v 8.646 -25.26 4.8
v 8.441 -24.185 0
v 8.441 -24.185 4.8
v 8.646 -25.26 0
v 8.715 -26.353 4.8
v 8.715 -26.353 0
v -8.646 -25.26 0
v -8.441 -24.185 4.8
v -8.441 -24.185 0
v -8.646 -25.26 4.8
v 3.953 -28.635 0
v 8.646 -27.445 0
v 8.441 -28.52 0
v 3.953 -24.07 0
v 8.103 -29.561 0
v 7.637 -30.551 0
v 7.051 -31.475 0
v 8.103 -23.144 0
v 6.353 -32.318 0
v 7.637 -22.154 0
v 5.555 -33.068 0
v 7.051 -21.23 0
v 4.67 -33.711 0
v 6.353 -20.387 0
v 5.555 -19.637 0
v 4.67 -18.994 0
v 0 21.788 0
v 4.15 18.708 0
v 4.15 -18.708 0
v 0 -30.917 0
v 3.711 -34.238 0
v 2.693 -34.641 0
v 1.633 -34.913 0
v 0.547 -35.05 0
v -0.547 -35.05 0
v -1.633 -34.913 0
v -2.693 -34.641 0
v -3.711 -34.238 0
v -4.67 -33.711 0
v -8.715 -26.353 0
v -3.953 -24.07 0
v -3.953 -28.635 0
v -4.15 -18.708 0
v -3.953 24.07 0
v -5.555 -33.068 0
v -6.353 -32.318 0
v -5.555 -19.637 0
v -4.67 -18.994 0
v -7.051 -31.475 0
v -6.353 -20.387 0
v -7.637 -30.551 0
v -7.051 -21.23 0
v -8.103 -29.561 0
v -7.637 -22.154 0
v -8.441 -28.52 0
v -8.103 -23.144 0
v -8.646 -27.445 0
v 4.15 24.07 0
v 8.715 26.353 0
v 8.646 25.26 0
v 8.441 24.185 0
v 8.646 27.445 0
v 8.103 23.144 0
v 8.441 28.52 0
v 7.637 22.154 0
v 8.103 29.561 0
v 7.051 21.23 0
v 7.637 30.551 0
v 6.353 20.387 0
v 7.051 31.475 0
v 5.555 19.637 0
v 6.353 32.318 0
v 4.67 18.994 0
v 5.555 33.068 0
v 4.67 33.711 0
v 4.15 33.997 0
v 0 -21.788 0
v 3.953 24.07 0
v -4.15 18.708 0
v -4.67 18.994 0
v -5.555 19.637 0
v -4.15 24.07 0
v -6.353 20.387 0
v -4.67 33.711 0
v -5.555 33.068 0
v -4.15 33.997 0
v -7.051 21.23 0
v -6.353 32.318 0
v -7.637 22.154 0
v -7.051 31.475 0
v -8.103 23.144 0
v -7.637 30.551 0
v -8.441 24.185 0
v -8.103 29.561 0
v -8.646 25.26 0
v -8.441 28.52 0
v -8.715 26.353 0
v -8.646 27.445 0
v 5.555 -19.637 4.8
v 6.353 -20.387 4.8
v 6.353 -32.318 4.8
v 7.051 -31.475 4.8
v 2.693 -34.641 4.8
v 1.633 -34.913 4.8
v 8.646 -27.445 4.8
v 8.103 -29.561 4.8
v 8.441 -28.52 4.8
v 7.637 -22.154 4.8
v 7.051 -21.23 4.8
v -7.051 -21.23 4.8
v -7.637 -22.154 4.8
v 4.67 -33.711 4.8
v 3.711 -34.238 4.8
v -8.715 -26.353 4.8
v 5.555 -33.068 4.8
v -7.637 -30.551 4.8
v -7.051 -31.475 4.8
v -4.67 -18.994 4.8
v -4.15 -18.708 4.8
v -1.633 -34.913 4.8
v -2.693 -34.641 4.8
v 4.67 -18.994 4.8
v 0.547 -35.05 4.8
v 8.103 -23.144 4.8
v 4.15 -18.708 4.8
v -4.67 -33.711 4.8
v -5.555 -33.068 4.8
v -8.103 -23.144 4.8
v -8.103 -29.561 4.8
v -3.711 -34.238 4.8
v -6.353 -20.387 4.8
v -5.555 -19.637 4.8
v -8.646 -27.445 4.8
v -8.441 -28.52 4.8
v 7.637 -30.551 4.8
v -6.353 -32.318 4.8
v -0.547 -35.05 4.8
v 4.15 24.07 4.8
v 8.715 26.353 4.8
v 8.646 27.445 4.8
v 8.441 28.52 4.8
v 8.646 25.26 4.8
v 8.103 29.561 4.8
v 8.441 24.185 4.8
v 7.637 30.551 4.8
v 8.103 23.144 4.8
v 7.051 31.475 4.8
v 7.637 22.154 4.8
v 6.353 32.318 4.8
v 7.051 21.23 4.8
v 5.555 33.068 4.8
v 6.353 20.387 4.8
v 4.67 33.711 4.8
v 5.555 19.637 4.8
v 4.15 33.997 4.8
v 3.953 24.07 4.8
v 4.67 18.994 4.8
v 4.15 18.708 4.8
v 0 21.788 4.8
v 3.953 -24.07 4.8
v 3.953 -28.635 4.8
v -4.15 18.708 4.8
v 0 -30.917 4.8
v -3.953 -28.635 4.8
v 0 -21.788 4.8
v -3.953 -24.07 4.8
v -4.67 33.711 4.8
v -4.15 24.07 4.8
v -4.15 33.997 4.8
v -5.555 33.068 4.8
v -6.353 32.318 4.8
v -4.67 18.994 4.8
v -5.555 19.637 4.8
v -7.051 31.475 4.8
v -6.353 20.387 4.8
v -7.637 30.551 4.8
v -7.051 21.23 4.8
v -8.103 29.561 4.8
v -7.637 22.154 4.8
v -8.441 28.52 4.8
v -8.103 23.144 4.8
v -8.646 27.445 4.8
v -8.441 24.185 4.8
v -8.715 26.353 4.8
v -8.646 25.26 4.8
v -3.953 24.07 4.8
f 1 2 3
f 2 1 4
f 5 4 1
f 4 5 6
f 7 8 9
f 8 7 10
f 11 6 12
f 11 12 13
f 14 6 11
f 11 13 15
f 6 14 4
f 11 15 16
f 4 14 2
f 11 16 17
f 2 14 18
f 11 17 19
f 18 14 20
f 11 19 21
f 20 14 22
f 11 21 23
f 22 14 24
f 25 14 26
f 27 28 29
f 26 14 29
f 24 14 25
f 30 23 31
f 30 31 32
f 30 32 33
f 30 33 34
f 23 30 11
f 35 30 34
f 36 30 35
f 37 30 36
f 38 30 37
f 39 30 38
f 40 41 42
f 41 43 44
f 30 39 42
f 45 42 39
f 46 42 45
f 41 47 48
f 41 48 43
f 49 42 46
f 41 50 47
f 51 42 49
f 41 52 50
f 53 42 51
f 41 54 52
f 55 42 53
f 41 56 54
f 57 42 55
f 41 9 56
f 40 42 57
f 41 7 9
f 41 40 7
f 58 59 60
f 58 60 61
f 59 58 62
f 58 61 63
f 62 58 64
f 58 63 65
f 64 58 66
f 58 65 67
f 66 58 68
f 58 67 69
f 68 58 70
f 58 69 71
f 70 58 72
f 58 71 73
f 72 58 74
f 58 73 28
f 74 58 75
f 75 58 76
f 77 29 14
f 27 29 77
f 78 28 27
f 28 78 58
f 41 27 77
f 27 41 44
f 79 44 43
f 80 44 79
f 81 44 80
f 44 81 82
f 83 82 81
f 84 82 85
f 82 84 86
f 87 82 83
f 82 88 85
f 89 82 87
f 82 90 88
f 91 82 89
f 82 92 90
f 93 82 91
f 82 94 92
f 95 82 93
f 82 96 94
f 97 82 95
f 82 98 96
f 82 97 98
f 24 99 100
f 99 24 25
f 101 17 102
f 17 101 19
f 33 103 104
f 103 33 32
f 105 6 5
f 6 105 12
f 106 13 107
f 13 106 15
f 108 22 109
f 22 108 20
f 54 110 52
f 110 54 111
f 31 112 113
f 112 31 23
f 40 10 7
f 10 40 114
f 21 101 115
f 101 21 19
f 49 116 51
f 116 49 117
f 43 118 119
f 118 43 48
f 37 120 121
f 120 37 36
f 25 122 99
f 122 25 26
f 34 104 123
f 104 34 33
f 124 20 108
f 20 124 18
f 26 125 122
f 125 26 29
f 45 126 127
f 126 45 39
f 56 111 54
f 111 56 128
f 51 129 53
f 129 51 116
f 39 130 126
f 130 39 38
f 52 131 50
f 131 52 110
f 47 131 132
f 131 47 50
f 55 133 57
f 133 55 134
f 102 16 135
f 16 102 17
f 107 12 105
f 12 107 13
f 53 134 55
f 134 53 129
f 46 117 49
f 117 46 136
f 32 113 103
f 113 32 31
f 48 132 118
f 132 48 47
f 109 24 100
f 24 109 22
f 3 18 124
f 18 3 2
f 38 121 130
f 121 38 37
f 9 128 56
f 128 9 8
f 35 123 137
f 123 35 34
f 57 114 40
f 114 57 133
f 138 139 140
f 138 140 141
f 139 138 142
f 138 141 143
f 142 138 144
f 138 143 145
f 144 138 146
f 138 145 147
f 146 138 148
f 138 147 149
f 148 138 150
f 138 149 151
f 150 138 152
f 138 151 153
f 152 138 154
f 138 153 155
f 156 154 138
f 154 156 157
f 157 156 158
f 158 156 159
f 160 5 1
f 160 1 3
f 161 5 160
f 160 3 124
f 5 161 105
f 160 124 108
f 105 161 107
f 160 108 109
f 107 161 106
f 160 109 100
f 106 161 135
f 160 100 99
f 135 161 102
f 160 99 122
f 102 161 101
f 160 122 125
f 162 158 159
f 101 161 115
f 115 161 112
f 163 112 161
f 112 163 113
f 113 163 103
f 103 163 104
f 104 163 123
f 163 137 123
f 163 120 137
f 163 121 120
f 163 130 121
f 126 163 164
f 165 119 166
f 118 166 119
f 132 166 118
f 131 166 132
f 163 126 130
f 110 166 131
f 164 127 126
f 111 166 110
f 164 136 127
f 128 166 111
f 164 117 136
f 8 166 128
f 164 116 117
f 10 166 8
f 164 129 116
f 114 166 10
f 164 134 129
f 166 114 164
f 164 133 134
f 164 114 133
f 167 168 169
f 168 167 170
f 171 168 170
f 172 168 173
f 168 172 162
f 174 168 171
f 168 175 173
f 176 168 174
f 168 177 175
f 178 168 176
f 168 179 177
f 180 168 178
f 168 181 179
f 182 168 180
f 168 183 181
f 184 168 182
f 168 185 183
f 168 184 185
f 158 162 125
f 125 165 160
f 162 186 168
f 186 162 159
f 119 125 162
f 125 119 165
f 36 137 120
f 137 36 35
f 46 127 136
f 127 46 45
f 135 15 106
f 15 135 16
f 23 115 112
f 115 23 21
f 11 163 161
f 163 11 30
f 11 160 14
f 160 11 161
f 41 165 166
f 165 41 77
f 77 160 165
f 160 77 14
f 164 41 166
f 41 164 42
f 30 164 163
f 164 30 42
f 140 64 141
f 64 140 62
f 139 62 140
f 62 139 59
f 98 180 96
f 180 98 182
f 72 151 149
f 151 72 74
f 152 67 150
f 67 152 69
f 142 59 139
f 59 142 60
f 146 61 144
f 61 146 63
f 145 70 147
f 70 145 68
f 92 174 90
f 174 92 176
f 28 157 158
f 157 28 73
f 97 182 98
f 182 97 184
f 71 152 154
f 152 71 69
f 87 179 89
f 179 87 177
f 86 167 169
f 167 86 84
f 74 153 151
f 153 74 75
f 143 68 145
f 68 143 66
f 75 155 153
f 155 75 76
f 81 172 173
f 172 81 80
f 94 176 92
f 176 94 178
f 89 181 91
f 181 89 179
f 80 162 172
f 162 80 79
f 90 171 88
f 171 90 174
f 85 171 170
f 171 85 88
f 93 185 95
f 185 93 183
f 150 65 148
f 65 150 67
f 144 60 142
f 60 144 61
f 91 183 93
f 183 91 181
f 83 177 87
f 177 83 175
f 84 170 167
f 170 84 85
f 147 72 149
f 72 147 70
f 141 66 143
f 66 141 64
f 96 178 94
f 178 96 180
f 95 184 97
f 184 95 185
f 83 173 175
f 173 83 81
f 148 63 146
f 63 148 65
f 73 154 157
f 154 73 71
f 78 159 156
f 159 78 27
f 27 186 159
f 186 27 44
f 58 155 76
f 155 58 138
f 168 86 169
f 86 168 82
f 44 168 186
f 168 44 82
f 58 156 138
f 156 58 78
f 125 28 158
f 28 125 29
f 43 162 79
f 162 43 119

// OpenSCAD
//use <../MCAD/shapes.scad>		// For octagon

$fn = 50;					// So the cylinders are smooth

nut_diameter = 8.3;			// My M3 nut measured ~5.4, I added a fudge factor
nut_thickness = 4;

// Calculate some nice values

wrench_thickness = 1.2 * nut_thickness;
wrench_length = 5.25 * nut_diameter;
wrench_head_extra_d = 1.1 * nut_diameter;	// If your wrench is big, you
										// probably just want this to be 10

// Something to make wrench heads for us

module wrench_head(thickness, nut_d, head_extra, open_ended) {
	difference() {
		translate([0, 0, -thickness / 2]) {
			cylinder(h = thickness, r = (nut_d + head_extra) / 2);
		}

		rotate(30) {
			hexagon(nut_d, thickness * 1.1);
		}

		translate([0, nut_d / 2, 0]) {
			if (open_ended) {
				box(nut_d, nut_d + head_extra / 2, thickness * 1.1);
			}
		}
	}
}

// Put us flat on the bed

translate([0, 0, wrench_thickness / 2]) {

	// The handle

	box(nut_diameter, wrench_length, wrench_thickness);

	// Make the closed head

	translate([0, -((wrench_length + wrench_head_extra_d) / 2), 0]) {
		wrench_head(wrench_thickness, nut_diameter, wrench_head_extra_d, false);
	}

	// And the open head

	translate([0, (wrench_length + wrench_head_extra_d) / 2, 0]) {
		wrench_head(wrench_thickness, nut_diameter, wrench_head_extra_d, true);
	}
}

module hexagon(diameter, thickness) {
    cylinder(r = diameter * 1.1 / 2, h = thickness, $fn = 6, center = true);
}

module box(b_width, b_length, b_thick) {
    cube([b_width, b_length, b_thick], center = true);
}
    
